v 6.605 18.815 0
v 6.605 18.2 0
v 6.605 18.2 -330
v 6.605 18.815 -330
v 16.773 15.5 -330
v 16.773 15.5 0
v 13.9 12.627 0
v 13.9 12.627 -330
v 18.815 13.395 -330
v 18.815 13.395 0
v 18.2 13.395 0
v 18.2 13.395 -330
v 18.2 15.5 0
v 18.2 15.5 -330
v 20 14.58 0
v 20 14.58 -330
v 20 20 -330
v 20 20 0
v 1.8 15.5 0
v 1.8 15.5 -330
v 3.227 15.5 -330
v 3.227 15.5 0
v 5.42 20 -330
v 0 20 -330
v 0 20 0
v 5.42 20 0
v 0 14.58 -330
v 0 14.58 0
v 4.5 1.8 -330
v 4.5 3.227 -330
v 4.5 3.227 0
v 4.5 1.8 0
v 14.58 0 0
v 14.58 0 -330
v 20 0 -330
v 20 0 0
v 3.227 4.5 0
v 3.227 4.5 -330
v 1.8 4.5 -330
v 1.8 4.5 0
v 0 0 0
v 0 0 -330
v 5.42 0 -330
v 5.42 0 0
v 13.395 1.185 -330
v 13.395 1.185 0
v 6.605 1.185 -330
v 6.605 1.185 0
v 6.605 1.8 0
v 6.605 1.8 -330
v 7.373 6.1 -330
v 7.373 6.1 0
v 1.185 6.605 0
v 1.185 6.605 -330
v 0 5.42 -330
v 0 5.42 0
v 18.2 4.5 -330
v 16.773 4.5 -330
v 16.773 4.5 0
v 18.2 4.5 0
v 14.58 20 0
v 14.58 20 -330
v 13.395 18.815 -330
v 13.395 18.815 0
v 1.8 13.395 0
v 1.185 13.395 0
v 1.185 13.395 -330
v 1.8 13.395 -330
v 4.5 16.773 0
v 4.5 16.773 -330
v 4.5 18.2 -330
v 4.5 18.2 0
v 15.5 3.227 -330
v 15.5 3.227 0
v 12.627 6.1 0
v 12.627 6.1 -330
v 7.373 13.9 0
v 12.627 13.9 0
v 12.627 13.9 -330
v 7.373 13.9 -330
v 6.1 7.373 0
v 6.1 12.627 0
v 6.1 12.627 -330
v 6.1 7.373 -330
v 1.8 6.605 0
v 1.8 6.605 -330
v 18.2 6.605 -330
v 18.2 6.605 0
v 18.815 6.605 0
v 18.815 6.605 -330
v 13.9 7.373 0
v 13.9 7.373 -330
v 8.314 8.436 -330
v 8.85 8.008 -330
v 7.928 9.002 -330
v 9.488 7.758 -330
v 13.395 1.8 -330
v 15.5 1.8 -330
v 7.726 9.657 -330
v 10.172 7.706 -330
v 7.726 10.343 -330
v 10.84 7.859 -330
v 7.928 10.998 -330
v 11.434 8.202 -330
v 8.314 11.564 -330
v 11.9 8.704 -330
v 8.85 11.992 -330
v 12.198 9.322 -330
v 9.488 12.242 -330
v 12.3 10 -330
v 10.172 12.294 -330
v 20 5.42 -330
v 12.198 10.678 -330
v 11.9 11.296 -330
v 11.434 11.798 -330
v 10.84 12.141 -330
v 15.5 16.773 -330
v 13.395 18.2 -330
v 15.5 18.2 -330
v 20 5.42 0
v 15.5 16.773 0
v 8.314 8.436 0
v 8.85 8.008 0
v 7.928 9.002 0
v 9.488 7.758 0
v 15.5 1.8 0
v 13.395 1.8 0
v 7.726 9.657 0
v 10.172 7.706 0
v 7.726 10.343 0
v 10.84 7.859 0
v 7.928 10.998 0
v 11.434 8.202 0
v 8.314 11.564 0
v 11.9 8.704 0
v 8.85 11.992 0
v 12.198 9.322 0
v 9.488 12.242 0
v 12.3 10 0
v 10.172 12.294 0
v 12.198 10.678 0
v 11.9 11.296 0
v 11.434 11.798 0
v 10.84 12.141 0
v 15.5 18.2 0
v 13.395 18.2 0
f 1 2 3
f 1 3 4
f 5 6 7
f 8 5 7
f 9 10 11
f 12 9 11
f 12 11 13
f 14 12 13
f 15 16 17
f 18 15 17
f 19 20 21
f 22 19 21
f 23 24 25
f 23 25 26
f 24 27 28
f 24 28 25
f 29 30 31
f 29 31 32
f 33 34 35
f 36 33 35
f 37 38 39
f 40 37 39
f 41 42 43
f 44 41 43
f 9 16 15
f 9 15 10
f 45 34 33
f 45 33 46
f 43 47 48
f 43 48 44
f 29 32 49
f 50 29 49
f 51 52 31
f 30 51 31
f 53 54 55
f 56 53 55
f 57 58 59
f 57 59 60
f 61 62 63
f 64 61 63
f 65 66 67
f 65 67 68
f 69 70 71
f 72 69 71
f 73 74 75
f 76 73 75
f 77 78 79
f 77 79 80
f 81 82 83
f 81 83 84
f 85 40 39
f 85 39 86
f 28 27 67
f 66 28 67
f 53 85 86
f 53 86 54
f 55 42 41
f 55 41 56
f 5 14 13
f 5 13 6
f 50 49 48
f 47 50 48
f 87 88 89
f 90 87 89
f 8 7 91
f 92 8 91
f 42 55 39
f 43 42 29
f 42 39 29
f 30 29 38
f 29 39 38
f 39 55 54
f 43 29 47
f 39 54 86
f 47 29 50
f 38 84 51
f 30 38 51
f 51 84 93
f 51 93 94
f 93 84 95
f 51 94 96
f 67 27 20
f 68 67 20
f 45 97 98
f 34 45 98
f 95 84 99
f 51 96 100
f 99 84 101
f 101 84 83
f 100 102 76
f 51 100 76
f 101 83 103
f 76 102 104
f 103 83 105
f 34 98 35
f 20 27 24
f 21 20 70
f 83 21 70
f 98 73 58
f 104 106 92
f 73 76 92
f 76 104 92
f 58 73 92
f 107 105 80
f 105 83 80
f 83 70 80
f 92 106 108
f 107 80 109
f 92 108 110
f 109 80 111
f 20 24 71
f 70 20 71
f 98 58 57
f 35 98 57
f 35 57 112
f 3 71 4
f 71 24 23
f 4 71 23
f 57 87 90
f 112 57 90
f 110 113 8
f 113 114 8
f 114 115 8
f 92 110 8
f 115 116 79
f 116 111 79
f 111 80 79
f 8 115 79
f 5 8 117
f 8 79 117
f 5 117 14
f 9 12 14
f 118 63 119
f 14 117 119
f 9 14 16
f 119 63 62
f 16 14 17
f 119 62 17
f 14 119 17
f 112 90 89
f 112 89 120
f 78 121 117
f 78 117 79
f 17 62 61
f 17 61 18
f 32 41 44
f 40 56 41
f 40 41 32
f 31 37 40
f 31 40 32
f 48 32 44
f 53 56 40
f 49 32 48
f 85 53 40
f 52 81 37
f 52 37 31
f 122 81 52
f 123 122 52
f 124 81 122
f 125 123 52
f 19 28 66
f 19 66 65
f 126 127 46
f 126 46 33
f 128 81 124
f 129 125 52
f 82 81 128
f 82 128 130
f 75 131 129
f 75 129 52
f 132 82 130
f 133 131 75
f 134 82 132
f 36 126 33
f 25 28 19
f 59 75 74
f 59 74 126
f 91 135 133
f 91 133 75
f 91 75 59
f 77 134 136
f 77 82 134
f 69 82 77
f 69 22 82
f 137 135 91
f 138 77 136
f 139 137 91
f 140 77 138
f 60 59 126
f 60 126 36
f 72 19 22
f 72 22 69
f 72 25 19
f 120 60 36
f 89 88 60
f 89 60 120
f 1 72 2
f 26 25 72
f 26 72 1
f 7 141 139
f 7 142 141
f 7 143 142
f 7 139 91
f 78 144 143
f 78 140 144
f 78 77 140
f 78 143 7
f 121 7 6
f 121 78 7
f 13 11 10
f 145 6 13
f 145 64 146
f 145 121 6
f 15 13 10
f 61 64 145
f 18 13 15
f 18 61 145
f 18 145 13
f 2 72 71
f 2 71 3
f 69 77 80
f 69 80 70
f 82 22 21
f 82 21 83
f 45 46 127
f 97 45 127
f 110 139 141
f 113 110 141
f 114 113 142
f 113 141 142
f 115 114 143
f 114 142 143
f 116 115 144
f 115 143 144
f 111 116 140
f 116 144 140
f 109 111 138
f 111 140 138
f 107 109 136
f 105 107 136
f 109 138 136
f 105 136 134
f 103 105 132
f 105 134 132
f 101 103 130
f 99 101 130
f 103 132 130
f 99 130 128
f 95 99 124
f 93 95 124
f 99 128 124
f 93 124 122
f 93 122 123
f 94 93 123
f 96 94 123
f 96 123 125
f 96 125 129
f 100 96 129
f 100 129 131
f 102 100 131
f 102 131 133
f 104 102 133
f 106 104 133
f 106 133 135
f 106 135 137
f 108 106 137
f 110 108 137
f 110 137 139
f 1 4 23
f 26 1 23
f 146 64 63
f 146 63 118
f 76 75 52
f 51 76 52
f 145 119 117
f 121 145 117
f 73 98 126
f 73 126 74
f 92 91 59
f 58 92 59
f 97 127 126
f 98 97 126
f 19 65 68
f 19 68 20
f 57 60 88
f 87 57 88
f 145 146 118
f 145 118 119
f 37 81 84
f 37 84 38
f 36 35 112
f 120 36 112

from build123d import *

# Parameters (mm, degrees)
SKETCH1_W           = 20
SKETCH1_H           = 20
BOSS_EXTRUDE1_DEPTH = 330
SKETCH2_R           = 2.3
CUT_EXTRUDE1_DEPTH  = 331


with BuildPart() as part:
    # Sketch1 → Boss-Extrude1 (new body)
    with BuildSketch(Plane.XY):
        with Locations((10, 10)):
            Rectangle(SKETCH1_W, SKETCH1_H)
    extrude(amount=-BOSS_EXTRUDE1_DEPTH)

    # Sketch2 → Cut-Extrude1 (cut, through all)
    with BuildSketch(Plane.XY):
        with Locations((10, 10)):
            Circle(SKETCH2_R)
        Polygon((5.42, 20), (14.58, 20), (13.395, 18.815), (13.395, 18.2), (15.5, 18.2), (15.5, 16.772792206), (12.627207794, 13.9), (7.372792206, 13.9), (4.5, 16.772792206), (4.5, 18.2), (6.605, 18.2), (6.605, 18.815), align=None)
        Polygon((6.605, 1.185), (5.42, 0), (14.58, 0), (13.395, 1.185), (13.395, 1.8), (15.5, 1.8), (15.5, 3.227207794), (12.627207794, 6.1), (7.372792206, 6.1), (4.5, 3.227207794), (4.5, 1.8), (6.605, 1.8), align=None)
        Polygon((1.8, 6.605), (1.185, 6.605), (0, 5.42), (0, 14.58), (1.185, 13.395), (1.8, 13.395), (1.8, 15.5), (3.227207794, 15.5), (6.1, 12.627207794), (6.1, 7.372792206), (3.227207794, 4.5), (1.8, 4.5), align=None)
        Polygon((18.815, 6.605), (20, 5.42), (20, 14.58), (18.815, 13.395), (18.2, 13.395), (18.2, 15.5), (16.772792206, 15.5), (13.9, 12.627207794), (13.9, 7.372792206), (16.772792206, 4.5), (18.2, 4.5), (18.2, 6.605), align=None)
    extrude(amount=-CUT_EXTRUDE1_DEPTH, mode=Mode.SUBTRACT)


solid = part.part
